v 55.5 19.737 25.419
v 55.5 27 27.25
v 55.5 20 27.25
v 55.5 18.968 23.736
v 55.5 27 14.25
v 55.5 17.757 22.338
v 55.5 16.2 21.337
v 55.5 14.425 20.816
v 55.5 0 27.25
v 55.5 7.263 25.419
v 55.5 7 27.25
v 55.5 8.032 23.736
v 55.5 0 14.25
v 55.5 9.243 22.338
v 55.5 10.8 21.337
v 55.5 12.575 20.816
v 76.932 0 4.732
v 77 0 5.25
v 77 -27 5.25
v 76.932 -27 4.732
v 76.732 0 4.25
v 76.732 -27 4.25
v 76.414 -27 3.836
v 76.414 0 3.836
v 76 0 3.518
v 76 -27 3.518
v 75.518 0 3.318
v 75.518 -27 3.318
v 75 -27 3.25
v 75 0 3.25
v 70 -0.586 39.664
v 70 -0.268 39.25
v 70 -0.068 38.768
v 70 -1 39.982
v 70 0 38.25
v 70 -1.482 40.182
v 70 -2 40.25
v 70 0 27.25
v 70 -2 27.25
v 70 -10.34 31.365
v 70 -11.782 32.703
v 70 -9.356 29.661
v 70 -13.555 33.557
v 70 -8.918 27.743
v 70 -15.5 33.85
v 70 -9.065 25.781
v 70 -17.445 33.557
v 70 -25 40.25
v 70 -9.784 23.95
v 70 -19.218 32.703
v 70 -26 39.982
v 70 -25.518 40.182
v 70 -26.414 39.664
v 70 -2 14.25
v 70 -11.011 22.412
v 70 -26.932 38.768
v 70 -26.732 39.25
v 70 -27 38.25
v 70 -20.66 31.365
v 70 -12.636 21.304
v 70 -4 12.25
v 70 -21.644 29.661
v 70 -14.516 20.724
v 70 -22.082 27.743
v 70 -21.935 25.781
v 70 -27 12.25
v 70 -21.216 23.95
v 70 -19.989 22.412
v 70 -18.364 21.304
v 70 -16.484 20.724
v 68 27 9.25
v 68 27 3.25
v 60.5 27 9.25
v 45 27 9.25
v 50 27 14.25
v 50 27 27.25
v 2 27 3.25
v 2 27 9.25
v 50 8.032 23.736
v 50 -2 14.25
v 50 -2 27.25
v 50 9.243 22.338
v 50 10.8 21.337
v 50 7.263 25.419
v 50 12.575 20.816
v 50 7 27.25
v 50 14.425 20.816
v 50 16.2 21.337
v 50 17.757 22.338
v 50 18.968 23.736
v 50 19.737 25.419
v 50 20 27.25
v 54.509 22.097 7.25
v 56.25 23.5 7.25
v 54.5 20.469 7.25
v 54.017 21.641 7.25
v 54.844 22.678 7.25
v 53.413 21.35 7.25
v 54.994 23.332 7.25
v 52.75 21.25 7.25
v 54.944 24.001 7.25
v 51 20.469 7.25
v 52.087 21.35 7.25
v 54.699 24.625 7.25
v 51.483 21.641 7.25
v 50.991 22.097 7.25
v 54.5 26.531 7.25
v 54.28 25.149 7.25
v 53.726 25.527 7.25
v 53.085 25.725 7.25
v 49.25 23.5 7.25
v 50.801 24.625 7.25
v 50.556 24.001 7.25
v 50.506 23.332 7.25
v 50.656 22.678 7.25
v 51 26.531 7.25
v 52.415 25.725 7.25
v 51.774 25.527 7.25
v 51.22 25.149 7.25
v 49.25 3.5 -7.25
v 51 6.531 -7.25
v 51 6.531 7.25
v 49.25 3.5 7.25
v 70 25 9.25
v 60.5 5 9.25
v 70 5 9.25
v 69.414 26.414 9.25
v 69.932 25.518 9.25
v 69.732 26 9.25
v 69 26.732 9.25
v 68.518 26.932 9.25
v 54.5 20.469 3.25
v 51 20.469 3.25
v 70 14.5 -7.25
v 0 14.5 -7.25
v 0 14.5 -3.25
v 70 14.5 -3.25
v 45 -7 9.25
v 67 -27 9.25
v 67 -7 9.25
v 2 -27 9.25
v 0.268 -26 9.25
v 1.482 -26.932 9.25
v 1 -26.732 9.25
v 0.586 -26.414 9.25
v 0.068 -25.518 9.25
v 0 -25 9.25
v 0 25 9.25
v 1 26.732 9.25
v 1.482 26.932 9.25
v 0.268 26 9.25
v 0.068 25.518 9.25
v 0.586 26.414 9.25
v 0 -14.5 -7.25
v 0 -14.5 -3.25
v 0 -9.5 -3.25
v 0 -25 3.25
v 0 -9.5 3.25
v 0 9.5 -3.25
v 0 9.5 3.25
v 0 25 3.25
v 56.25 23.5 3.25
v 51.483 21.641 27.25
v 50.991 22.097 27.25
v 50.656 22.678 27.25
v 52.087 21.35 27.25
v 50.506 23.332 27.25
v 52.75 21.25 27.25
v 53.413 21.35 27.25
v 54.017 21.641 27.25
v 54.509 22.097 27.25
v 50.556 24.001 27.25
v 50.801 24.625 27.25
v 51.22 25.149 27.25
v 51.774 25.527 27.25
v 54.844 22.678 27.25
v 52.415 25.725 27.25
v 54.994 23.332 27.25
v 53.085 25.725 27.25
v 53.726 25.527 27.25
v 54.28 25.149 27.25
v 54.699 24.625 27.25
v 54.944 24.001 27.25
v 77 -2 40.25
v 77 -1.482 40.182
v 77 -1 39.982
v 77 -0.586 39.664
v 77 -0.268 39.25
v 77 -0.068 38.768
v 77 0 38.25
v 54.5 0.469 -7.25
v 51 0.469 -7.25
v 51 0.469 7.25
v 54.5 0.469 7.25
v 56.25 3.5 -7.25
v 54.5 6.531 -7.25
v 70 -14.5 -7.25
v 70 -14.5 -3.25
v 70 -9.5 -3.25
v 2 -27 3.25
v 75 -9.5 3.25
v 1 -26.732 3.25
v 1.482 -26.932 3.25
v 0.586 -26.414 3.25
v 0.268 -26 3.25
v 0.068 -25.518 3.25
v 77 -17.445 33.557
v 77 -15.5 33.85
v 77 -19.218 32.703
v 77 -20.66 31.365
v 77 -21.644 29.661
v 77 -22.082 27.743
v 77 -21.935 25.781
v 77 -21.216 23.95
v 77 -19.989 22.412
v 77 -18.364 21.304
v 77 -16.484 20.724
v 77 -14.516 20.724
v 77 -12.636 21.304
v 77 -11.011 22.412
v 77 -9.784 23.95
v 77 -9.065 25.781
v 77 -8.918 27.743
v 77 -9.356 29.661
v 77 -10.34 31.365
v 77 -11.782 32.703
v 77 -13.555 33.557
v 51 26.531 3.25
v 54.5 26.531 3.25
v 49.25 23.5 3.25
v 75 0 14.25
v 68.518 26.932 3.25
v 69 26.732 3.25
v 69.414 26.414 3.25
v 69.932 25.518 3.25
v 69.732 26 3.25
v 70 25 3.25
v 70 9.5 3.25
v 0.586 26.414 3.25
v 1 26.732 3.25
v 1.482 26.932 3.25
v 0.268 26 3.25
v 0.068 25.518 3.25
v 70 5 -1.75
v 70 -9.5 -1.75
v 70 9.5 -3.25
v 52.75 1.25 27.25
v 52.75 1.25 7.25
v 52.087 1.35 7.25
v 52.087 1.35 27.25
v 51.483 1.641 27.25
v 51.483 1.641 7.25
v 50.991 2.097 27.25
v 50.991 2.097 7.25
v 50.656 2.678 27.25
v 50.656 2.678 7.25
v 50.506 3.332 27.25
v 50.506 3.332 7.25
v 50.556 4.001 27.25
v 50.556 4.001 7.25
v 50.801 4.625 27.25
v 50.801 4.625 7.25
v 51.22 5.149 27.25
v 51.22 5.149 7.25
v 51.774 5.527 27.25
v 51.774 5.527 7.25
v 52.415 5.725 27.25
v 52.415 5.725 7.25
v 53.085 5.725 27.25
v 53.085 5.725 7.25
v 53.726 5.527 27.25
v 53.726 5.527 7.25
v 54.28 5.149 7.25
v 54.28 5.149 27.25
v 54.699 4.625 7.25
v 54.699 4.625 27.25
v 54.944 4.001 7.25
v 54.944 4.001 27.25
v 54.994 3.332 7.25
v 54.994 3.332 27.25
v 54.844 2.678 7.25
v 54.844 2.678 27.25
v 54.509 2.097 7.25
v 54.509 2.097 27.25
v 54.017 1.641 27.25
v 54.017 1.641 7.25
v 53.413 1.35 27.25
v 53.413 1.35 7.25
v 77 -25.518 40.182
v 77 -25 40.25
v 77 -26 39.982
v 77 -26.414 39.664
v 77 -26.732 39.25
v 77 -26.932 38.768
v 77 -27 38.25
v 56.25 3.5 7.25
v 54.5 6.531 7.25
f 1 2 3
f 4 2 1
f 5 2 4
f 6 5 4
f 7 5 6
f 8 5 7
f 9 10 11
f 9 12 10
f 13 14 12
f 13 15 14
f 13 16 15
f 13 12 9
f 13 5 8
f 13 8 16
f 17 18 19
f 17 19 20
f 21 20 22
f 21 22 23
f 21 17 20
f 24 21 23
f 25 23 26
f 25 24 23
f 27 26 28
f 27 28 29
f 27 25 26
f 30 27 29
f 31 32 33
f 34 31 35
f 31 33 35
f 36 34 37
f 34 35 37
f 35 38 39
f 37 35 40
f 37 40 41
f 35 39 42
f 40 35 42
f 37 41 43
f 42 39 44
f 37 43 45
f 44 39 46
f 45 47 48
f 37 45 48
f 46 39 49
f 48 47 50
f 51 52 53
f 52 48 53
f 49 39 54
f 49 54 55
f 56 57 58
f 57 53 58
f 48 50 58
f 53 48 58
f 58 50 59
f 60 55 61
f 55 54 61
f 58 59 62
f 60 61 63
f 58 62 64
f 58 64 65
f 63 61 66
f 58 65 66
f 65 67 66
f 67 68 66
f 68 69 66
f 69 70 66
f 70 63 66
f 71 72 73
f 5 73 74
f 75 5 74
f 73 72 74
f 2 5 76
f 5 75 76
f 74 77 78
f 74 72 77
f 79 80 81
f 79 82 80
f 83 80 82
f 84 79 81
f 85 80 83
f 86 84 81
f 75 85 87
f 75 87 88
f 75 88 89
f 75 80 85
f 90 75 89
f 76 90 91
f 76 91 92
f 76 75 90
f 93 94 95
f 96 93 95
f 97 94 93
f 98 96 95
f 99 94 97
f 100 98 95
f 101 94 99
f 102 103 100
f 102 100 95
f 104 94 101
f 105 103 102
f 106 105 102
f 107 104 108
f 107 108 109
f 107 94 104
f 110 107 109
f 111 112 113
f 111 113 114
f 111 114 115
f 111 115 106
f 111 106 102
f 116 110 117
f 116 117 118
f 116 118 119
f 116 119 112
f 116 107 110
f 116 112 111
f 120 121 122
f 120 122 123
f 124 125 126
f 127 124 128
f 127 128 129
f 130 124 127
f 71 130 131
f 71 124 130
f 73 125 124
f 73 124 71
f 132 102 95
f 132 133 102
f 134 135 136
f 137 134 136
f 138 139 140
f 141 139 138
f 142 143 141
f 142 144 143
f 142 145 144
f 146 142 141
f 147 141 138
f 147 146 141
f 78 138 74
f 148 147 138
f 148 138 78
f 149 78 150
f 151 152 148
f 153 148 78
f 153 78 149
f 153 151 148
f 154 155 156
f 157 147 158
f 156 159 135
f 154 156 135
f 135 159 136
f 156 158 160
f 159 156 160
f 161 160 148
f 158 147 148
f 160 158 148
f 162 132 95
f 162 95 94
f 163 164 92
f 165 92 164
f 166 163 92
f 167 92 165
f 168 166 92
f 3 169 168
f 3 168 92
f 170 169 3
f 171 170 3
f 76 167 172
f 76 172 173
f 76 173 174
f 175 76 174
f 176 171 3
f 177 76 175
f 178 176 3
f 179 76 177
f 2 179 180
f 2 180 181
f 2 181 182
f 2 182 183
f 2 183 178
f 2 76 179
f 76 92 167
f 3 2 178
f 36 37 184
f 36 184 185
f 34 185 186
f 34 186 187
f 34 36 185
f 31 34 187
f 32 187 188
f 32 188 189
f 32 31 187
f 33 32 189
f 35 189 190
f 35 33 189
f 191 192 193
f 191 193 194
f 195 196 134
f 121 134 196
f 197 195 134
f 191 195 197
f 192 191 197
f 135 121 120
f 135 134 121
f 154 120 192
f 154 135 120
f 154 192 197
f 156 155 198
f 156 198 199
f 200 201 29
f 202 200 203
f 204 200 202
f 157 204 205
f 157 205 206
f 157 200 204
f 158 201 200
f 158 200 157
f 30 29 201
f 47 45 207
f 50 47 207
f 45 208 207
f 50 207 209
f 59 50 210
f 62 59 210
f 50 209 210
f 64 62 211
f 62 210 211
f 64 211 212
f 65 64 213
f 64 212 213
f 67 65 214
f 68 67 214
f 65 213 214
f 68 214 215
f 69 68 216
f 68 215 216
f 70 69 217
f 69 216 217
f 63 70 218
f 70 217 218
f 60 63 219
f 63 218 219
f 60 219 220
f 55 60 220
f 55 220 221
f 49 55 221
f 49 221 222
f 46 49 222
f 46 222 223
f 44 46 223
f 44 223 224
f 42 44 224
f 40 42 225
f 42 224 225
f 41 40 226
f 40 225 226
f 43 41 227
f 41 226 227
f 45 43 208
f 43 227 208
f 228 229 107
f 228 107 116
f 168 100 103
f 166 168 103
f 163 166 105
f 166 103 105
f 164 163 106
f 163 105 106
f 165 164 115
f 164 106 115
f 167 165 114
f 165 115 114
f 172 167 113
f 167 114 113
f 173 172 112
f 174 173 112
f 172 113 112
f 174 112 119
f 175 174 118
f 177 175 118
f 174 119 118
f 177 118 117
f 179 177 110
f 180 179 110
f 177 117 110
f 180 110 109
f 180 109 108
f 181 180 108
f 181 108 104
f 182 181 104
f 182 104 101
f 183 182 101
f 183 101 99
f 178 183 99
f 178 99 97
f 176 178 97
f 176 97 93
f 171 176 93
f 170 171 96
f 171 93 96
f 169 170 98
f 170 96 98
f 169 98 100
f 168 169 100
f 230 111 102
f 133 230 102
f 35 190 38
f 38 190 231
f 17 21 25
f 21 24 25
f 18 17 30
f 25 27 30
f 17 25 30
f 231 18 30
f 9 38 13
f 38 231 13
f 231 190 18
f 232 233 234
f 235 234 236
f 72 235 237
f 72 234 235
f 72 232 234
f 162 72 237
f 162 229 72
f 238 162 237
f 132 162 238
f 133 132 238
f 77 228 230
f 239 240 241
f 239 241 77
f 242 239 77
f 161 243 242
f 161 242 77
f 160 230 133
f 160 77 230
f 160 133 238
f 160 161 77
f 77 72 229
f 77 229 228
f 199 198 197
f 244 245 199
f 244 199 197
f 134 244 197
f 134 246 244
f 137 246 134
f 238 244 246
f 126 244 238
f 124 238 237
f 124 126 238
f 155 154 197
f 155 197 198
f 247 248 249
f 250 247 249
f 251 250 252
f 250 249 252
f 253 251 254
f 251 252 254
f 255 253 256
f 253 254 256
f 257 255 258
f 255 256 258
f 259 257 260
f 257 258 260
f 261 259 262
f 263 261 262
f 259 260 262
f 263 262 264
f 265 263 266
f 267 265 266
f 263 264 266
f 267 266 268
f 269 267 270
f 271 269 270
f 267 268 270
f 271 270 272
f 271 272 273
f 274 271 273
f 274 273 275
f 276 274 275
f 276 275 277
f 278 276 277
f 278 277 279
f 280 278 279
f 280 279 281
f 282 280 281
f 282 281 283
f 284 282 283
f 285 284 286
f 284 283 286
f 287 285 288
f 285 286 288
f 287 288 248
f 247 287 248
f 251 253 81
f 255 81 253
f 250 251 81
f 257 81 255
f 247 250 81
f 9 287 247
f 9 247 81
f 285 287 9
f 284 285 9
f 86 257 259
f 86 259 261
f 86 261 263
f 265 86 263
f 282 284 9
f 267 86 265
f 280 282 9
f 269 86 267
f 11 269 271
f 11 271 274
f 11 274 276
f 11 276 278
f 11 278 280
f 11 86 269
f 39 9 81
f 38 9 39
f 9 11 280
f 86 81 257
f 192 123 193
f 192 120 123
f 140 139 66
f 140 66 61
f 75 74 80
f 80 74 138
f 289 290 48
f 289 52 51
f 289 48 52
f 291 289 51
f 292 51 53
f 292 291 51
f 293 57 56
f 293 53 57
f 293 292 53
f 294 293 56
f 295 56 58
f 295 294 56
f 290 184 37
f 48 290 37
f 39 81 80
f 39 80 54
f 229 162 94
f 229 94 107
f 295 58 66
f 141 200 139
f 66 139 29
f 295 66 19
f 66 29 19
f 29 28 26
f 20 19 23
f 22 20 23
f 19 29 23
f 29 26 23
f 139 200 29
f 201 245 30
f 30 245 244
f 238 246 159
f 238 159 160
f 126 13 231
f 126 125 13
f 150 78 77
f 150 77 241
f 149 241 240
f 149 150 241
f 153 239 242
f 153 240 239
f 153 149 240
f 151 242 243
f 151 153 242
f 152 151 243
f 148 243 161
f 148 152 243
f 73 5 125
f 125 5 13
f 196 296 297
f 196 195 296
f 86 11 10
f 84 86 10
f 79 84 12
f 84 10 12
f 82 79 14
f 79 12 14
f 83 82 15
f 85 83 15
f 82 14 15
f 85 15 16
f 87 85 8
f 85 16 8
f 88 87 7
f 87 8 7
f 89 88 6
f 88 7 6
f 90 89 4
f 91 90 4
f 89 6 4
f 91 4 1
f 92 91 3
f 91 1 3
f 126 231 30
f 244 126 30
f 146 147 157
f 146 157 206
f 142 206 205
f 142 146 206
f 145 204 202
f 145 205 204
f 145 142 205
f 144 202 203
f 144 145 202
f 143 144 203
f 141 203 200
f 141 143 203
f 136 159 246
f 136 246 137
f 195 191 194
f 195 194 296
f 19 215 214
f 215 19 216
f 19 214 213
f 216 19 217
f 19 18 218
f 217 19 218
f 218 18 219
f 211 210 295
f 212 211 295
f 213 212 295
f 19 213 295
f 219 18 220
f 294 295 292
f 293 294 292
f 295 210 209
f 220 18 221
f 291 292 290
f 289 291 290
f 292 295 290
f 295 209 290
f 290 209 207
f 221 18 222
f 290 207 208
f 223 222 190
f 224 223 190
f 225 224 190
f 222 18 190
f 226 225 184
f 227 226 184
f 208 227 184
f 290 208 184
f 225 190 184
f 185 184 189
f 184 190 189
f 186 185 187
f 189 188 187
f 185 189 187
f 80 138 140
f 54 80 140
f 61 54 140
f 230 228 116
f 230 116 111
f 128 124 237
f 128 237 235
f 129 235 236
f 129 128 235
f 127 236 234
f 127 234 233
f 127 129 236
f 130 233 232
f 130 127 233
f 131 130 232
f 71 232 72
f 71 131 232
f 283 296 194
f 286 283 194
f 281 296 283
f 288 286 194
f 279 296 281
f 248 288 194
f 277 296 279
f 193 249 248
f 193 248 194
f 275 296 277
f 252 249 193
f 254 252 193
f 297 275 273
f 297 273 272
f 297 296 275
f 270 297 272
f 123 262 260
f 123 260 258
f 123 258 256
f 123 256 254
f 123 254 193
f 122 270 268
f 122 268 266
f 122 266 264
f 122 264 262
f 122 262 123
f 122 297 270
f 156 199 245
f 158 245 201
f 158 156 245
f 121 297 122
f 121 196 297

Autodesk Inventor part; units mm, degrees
ref_plane "YZ Plane" through (0, 0, 0) normal (1, 0, 0) x (0, 1, 0)
ref_plane "XZ Plane" through (0, 0, 0) normal (0, 1, 0) x (-1, 0, 0)
ref_plane "XY Plane" through (0, 0, 0) normal (0, 0, 1) x (1, 0, 0)
sketch "Sketch2" plane through (0, 0, 0) normal (1, 0, 0) x (0, 1, 0)
  line L0 (-19.9252, 0) -> (19.9252, 0)
  line L1 (0, -28.9507) -> (0, 28.9507)
  line L2 (14.5, -7.25) -> (-14.5, -7.25)
  line L3 (-14.5, -7.25) -> (-14.5, -3.25)
  line L4 (-9.5, -3.25) -> (-9.5, 3.25)
  line L5 (-27, 3.25) -> (-27, 9.25)
  line L6 (-27, 9.25) -> (27, 9.25)
  line L7 (14.5, -7.25) -> (14.5, -3.25)
  line L8 (9.5, -3.25) -> (9.5, 3.25)
  line L9 (27, 3.25) -> (27, 9.25)
  line L10 (-14.5, -3.25) -> (-9.5, -3.25)
  line L11 (9.5, -3.25) -> (14.5, -3.25)
  line L12 (27, 3.25) -> (9.5, 3.25)
  line L13 (-9.5, 3.25) -> (-27, 3.25)
  point P0 (0, 0)
  point P1 (0, 0)
  point P2 (9.5, 0)
  dimension "d4" = 14.5
  dimension "d8" = 27
  dimension "d9" = 9.5
  dimension "d10" = 4
  dimension "d11" = 6.5
  dimension "d12" = 6
extrude "Extrusion2" add sketch "Sketch2" along normal blind 70
sketch "Sketch3" plane through (0, -27, 9.25) normal (0, 0, 1) x (1, 0, 0)
  line L0 (0, 0) -> (70, 0) projected
  line L1 (0, 54) -> (70, 54) projected
  line L2 (50, 27) -> (50, 54)
  line L3 (50, 54) -> (55.5, 54)
  line L4 (55.5, 54) -> (55.5, 27)
  line L5 (70, 54) -> (70, 0) projected
  line L6 (50, 27) -> (55.5, 27)
  point P0 (0, 27)
  dimension "d15" = 20
  dimension "d16" = 5.5
  dimension "d43" = 27
  dimension "d44" = 27
extrude "Extrusion3" add sketch "Sketch3" along normal blind 18
sketch "Sketch7" plane through (0, -27, 3.25) normal (0, 0, -1) x (-1, 0, 0)
  line L0 (0, 0) -> (70, 0)
  line L1 (-70, 0) -> (-77, 0)
  line L2 (-77, 0) -> (-77, 27)
  line L3 (-77, 27) -> (-70, 27)
  line L4 (-70, 27) -> (-70, 0)
  line L5 (70, 54) -> (70, 0)
  line L6 (-70, 0) -> (-70, 17.5) projected
  point P0 (0, 27)
  dimension "d45" = 7
  dimension "d50" = 0
extrude "Extrusion6" add sketch "Sketch7" against normal blind 37
sketch "Sketch9" plane through (50, 0, 9.25) normal (-1, 0, 0) x (0, 0, 1)
  line L0 (18, 27) -> (18, 0) projected
  line L1 (0, -27) -> (31, -27) projected
  point P0 (-9.25, 0)
  point P1 (18, 13.5)
hole "Hole2" at (50, 13.5, 27.25) direction (1, 0, 0) diameter 13 end through all
sketch "Sketch10" plane through (0, -27, 27.25) normal (0, 0, 1) x (1, 0, 0)
  line L0 (55.5, 54) -> (50, 54) projected
  line L1 (50, 54) -> (50, 47) projected
  line L2 (55.5, 40.5) -> (50, 40.5)
  line L3 (50, 34) -> (50, 47)
  line L4 (70, 54) -> (70, 27) projected
  line L5 (55.5, 54) -> (70, 54) projected
  point P0 (0, 27)
  point P1 (52.75, 50.5)
  point P2 (52.75, 30.5)
  dimension "d99" = 20
  dimension "d100" = 13.5
  dimension "d101" = 2.75
  dimension "d102" = 3.5
  dimension "d103" = 2.75
  dimension "d104" = 23.5
hole "Hole3" at (52.75, 23.5, 27.25) at (52.75, 3.5, 27.25) direction (0, 0, -1) diameter 4.5 end through all
sketch "Sketch11" plane through (0, -14.5, -7.25) normal (0, 0, -1) x (-1, 0, 0)
  circle A0 centre (-52.75, 18) radius 2.25 projected
  line L0 (-56.25, 18) -> (-54.5, 21.0311)
  line L1 (-54.5, 21.0311) -> (-51, 21.0311)
  line L2 (-51, 21.0311) -> (-49.25, 18)
  line L3 (-49.25, 18) -> (-51, 14.9689)
  line L4 (-51, 14.9689) -> (-54.5, 14.9689)
  line L5 (-54.5, 14.9689) -> (-56.25, 18)
  circle A1 centre (-52.75, 38) radius 2.25 projected
  line L6 (-56.25, 38) -> (-54.5, 41.0311)
  line L7 (-54.5, 41.0311) -> (-51, 41.0311)
  line L8 (-51, 41.0311) -> (-49.25, 38)
  line L9 (-49.25, 38) -> (-51, 34.9689)
  line L10 (-51, 34.9689) -> (-54.5, 34.9689)
  line L11 (-54.5, 34.9689) -> (-56.25, 38)
  point P0 (0, 14.5)
  dimension "d71" = 7
  dimension "d74" = 7
extrude "Extrusion7" cut sketch "Sketch11" against normal blind 14.5
fillet "Fillet1" radius 2 6 edges at (73.5, 0, 40.25) (73.5, -27, 40.25) (70, 27, 6.25) (0, 27, 6.25) (0, -27, 6.25) (77, -13.5, 3.25)
sketch "Sketch13" plane through (50, 0, 9.25) normal (0, -1, 0) x (1, 0, 0)
  line L0 (27, -4) -> (27, 29) projected
  line L1 (0, 18) -> (27, 18)
  line L2 (27, 18) -> (27, 0)
  line L3 (27, 0) -> (0, 0)
  line L4 (0, 0) -> (0, 18)
  point P0 (-50, -9.25)
  point P1 (20, 0)
  dimension "d95" = 0
extrude "Extrusion9" add sketch "Sketch13" along normal blind 2
chamfer "Chamfer3" distance 5 angle 45 6 edges at (50, 12.5, 9.25) (55.5, 13.5, 9.25) (70, -4.75, 3.25) (70, 0, 6.25) (62.75, 0, 9.25) (60, -2, 9.25)
sketch "Sketch14" plane through (70, -25, 40.25) normal (-1, 0, 0) x (0, 0, 1)
  circle A0 centre (-13, 9.5) radius 9.5
  line L0 (-31, -2) -> (-2, -2) projected
  line L1 (0, 23) -> (0, 0) projected
  point P0 (-40.25, 25)
  point P1 (-26, -2)
  dimension "d85" = 19
  dimension "d86" = 11.5
  dimension "d94" = 13
hole "Hole4" at (70, -15.5, 27.25) direction (1, 0, 0) diameter 13.2 end through all
chamfer "Chamfer4" distance 3 angle 45 1 edges at (70, -17, 9.25)
properties part number "CarroXY - Hotend"
